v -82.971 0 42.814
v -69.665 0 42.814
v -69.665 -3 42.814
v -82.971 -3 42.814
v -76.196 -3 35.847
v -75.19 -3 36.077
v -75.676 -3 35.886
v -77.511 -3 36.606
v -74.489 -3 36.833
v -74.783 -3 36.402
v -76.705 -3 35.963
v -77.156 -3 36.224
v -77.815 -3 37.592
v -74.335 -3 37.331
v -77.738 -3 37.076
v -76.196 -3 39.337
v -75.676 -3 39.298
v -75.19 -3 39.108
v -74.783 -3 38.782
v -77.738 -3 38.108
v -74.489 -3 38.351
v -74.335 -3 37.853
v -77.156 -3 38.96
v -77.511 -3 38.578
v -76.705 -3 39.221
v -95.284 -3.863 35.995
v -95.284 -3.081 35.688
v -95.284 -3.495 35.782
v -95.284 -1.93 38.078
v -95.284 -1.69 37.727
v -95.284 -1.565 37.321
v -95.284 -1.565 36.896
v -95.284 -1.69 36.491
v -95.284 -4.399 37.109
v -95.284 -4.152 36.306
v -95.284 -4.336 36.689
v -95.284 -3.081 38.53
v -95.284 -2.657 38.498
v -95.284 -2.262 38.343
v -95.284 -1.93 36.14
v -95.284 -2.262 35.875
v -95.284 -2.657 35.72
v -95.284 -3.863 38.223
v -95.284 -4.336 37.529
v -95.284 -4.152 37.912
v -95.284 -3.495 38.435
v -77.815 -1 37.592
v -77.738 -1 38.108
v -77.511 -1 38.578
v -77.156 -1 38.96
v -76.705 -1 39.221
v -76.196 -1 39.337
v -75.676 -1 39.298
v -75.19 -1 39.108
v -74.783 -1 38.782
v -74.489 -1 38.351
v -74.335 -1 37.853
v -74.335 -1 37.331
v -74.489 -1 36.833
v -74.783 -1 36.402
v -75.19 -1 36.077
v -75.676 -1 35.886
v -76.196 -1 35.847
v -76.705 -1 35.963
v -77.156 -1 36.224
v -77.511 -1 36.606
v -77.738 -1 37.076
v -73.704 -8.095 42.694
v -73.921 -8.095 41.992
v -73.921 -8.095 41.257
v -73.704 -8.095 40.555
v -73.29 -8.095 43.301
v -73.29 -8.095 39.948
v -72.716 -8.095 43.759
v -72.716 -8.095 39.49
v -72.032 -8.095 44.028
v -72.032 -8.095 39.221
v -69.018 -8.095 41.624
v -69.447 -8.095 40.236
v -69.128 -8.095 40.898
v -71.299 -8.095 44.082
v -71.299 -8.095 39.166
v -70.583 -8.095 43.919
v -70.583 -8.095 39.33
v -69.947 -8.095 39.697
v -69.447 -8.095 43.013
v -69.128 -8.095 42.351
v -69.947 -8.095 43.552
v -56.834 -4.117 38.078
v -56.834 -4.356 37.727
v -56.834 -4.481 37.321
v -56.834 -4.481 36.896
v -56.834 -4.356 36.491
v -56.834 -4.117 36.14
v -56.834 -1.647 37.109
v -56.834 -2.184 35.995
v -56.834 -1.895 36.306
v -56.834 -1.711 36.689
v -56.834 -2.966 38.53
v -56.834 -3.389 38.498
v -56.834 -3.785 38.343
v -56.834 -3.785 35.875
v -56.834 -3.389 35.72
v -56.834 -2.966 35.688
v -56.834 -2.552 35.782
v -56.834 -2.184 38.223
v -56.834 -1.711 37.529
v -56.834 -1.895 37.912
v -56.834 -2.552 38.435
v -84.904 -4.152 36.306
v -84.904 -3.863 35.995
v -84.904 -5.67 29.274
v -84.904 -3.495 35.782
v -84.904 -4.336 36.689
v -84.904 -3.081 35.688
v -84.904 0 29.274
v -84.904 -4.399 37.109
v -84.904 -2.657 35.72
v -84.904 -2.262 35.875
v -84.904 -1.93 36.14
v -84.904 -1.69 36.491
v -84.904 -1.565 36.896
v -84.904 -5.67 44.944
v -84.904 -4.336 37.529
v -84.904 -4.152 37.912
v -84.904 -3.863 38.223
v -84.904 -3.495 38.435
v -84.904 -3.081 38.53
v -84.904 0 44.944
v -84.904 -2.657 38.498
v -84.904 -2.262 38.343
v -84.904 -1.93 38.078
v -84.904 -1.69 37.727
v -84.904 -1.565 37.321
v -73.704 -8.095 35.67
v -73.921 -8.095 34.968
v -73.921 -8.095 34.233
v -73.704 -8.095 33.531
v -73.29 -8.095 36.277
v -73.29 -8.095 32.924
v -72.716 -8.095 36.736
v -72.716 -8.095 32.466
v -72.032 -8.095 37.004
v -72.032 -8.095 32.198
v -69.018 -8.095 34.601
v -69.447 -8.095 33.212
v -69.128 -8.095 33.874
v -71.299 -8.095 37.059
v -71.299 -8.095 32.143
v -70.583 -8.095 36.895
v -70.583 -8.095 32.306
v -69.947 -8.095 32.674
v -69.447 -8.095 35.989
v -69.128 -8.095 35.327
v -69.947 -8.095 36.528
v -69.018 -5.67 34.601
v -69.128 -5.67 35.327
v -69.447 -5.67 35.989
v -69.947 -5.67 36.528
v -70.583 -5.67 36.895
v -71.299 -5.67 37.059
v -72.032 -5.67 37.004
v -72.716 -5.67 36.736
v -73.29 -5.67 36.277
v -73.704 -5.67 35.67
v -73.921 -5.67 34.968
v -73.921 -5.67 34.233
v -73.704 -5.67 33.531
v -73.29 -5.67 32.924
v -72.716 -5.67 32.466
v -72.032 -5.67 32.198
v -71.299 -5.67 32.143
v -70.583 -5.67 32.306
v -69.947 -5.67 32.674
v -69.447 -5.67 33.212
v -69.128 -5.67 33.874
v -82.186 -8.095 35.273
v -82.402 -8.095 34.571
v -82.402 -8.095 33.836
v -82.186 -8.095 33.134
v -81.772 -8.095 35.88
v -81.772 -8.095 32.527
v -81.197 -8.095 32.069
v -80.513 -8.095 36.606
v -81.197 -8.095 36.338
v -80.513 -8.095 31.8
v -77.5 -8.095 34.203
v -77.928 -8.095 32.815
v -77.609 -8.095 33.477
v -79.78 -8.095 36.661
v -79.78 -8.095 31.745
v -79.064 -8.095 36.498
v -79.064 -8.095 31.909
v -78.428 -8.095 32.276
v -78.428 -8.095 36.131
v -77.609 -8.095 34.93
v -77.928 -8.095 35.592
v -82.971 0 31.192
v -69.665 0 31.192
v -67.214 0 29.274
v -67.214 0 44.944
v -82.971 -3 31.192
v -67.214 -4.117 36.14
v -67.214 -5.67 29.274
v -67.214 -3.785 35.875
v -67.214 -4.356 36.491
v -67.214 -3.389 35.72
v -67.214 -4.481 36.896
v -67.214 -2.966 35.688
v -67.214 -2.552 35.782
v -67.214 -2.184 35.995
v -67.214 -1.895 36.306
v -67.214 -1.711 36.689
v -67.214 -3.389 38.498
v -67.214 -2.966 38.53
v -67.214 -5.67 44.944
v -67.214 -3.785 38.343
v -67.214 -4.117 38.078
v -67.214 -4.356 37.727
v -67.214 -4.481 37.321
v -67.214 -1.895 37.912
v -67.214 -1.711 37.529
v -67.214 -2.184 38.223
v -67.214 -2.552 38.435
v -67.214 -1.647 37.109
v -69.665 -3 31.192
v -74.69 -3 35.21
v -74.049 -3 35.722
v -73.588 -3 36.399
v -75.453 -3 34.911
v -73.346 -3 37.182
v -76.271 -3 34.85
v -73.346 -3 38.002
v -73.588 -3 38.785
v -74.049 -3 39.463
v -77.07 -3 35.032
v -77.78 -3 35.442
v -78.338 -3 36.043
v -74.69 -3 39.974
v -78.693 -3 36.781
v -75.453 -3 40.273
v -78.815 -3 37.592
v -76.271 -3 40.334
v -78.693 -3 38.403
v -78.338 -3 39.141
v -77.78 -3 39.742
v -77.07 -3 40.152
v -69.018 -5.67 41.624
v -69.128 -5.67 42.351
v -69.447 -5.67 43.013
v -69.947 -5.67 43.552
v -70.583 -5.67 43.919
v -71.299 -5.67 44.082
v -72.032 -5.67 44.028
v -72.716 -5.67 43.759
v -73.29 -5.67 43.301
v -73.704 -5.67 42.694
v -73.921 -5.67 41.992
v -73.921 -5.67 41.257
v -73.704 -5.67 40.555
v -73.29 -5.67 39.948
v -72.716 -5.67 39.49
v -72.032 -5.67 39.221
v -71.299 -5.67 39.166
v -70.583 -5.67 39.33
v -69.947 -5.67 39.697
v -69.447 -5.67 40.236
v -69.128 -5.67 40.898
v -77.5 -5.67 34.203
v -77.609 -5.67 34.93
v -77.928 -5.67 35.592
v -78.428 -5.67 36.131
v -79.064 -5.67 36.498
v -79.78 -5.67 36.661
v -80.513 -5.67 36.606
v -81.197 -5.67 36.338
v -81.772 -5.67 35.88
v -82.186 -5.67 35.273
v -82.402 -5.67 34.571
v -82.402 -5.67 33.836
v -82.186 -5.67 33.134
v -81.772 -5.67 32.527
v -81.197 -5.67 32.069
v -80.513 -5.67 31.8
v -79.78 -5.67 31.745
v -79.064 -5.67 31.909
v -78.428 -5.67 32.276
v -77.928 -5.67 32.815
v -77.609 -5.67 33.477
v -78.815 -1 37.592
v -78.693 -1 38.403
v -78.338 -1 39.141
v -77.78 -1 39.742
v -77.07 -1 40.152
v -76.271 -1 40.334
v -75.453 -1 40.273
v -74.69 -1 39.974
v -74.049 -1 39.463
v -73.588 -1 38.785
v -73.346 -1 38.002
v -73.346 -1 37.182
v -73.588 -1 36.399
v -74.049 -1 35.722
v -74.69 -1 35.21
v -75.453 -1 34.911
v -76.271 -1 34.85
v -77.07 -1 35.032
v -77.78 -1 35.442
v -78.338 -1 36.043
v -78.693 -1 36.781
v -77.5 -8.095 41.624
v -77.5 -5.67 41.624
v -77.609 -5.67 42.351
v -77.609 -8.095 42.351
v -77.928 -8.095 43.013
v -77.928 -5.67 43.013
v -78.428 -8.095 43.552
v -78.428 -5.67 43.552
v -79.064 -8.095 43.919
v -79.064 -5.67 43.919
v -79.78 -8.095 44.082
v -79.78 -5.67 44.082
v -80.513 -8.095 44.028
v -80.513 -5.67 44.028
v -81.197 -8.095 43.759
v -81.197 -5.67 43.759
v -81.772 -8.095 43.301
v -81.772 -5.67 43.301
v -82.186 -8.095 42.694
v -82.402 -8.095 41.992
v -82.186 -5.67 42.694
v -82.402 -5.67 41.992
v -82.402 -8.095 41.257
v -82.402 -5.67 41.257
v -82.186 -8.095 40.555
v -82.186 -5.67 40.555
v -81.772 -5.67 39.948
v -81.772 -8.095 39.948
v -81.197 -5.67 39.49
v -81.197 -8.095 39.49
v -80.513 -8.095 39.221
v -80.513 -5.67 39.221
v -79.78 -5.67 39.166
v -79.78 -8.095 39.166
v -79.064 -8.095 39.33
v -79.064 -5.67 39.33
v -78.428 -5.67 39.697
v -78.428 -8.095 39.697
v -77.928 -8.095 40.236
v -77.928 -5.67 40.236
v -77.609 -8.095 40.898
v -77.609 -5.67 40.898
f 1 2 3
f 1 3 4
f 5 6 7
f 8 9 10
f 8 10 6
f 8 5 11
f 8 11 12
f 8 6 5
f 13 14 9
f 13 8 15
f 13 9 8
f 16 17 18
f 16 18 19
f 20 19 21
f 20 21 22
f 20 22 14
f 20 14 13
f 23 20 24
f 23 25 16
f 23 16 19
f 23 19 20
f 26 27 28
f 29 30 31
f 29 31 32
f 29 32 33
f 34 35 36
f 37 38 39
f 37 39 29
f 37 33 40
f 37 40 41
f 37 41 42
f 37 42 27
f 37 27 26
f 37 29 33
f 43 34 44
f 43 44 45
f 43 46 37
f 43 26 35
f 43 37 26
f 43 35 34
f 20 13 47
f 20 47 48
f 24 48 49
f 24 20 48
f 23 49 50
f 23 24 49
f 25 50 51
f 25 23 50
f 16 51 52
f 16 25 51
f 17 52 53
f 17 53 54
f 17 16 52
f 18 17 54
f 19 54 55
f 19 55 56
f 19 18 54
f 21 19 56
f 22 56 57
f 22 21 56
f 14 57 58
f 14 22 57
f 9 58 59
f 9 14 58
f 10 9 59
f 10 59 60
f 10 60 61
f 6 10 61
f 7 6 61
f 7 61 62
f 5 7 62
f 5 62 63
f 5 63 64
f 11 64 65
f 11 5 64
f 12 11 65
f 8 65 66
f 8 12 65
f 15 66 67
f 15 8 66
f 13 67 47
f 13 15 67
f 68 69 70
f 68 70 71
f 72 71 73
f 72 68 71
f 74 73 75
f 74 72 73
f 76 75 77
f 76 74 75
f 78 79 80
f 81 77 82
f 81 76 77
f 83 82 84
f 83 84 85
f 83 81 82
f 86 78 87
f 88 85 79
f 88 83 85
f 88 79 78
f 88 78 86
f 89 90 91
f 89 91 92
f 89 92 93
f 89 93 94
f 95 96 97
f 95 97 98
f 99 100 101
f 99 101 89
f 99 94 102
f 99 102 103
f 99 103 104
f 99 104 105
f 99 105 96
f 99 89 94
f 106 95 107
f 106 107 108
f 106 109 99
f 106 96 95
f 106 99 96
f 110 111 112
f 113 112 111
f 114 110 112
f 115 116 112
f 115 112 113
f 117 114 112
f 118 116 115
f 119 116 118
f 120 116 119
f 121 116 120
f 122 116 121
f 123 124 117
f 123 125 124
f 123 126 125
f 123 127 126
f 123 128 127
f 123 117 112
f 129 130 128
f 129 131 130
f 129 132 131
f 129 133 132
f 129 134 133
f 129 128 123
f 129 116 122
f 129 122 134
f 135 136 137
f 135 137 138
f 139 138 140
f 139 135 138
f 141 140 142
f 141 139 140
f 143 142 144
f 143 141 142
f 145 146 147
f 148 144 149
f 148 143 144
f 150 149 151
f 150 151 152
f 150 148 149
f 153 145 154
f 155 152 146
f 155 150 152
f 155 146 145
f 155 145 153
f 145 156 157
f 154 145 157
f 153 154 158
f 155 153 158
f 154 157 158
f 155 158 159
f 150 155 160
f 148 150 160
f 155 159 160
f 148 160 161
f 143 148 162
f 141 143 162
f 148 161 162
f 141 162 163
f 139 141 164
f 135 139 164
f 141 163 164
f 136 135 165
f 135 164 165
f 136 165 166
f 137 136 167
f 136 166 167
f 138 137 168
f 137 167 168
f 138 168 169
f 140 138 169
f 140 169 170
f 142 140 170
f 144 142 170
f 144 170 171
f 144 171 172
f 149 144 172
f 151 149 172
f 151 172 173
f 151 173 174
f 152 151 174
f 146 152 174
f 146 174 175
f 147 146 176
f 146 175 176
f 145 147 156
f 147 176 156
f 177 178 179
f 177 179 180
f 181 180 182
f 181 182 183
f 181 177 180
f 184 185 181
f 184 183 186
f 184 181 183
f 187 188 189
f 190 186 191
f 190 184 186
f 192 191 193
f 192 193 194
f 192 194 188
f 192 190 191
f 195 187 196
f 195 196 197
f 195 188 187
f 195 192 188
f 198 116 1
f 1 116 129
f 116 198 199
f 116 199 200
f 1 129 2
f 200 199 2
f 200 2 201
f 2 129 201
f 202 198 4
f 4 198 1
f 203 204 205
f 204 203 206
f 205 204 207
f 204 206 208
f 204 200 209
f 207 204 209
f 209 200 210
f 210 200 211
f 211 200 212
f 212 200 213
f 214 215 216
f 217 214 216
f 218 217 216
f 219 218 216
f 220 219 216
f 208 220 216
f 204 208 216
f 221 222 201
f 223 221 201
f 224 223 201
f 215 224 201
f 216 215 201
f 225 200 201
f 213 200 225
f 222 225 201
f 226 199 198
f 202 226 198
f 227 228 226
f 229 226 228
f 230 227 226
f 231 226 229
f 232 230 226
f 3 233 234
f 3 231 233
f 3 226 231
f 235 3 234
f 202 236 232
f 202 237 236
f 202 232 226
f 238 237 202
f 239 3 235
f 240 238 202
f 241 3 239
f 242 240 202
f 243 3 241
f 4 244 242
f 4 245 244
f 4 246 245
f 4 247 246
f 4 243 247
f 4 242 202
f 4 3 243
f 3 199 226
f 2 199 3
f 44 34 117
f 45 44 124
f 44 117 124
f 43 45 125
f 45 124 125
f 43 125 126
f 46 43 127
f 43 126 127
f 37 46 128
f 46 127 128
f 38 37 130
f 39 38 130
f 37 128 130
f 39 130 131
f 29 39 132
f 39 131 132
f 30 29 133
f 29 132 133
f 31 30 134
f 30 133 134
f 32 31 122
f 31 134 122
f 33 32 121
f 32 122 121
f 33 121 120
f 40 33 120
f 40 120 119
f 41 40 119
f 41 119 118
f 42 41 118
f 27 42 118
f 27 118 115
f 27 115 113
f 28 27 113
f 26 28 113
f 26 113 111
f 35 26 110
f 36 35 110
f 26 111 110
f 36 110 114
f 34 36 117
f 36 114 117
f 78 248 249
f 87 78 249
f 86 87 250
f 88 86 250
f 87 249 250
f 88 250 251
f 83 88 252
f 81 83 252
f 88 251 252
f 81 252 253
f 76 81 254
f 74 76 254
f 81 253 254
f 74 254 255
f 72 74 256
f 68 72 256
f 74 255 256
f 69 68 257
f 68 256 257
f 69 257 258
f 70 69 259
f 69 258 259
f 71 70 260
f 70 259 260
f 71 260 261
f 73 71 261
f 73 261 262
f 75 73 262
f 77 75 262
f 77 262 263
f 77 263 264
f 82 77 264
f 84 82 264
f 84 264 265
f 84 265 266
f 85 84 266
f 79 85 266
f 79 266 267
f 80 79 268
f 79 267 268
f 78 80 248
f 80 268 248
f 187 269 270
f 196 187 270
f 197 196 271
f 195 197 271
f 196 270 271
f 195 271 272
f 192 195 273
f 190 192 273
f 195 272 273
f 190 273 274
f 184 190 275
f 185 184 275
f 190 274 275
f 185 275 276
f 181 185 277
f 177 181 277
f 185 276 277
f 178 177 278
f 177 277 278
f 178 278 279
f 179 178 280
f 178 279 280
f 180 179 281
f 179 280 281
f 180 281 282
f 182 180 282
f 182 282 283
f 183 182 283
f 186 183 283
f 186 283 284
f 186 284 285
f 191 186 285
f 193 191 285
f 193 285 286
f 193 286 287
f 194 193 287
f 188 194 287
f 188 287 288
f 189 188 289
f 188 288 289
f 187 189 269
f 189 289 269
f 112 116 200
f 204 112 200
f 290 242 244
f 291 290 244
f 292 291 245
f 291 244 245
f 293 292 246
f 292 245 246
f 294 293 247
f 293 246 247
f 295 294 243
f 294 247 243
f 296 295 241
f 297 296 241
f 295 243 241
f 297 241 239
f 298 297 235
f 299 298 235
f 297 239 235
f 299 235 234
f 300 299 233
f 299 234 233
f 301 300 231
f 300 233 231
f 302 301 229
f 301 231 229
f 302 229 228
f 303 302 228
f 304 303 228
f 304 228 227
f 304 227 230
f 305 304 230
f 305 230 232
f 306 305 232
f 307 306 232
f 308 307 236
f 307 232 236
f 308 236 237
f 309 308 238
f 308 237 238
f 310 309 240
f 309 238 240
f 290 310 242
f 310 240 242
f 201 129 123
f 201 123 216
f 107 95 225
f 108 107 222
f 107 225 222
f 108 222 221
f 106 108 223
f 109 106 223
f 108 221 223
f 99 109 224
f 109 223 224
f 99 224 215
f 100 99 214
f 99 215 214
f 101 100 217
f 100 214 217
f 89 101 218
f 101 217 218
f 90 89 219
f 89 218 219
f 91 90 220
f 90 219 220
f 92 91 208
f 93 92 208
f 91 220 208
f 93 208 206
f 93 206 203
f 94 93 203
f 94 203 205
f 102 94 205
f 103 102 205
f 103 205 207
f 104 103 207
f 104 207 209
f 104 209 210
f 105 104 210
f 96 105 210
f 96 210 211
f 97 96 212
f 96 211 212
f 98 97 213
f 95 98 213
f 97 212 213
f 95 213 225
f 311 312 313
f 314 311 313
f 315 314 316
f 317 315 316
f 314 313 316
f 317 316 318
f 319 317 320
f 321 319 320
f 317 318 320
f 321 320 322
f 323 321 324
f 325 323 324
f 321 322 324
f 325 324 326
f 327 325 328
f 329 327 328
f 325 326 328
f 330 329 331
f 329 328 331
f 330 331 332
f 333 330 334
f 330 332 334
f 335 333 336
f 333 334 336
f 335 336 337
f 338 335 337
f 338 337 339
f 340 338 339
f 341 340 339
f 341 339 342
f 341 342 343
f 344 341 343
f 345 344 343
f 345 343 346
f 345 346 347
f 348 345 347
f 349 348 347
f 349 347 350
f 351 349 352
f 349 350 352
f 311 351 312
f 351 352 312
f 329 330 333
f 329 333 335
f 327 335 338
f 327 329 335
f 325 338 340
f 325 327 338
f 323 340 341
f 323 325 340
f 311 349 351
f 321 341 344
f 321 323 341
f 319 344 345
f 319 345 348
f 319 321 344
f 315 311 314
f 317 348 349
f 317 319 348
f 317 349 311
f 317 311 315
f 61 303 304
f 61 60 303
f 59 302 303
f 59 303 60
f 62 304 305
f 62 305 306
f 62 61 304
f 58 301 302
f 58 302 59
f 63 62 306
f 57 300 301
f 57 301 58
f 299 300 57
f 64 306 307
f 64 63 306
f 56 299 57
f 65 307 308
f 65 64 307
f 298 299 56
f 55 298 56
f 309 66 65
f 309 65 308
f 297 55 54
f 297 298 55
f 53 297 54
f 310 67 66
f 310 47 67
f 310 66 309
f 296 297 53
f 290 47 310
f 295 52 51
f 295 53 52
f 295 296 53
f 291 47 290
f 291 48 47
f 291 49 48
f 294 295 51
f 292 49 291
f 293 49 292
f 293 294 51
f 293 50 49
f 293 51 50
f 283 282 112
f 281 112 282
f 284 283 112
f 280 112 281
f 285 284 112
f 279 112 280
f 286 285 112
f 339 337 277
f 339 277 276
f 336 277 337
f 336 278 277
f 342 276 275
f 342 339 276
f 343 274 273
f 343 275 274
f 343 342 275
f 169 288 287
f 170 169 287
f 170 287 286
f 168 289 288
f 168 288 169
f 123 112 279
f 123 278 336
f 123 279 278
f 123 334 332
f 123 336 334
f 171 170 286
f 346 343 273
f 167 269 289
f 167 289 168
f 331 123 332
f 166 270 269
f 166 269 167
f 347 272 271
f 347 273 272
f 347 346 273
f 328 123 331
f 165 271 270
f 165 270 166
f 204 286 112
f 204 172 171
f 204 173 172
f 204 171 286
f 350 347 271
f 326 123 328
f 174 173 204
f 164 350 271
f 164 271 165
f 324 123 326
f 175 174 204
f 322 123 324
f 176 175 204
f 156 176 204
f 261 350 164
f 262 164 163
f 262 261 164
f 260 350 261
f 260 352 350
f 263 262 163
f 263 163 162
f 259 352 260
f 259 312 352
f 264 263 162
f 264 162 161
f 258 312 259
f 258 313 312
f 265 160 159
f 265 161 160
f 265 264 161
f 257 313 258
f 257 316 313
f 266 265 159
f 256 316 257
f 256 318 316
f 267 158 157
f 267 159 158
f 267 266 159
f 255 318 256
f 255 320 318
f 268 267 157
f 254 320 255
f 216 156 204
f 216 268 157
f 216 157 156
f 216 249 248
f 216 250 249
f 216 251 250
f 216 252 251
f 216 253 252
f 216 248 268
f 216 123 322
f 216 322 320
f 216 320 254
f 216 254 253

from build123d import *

# Parameters (mm, degrees)
F0_R      = 7.84357
F0_R_2    = 7.775719
F1_DEPTH  = 5.67
F2_W      = 17.690338
F2_H      = 15.67
F3_DEPTH  = 5.67
F4_R      = 1.425
F5_DEPTH  = 10.38
F6_R      = 1.425
F7_DEPTH  = 10.38
F9_R      = 2.465
F10_DEPTH = 2.425
F11_W     = 13.306394
F11_H     = 11.622041
F12_DEPTH = 3
F13_R     = 2.75
F13_R_2   = 1.75
F14_DEPTH = 2


with BuildPart() as f1:
    # F0 (on Front) → F1 (new body)
    with BuildSketch(Plane.XZ):
        with Locations((-31.018244, 13.502214)):
            Circle(F0_R)
        with Locations((27.656266, 13.502214)):
            Circle(F0_R_2)
        with Locations((-31.018244, -35.786617)):
            Circle(F0_R_2)
        with Locations((27.656266, -35.786617)):
            Circle(F0_R_2)
    extrude(amount=F1_DEPTH)


with BuildPart() as f3:
    # F2 (on Front) → F3 (new body)
    with BuildSketch(Plane.XZ):
        with Locations((-76.058906, 37.108815)):
            Rectangle(F2_W, F2_H)
    extrude(amount=F3_DEPTH)

    # F4 (on face) → F5 (join)
    with BuildSketch(Plane(origin=(-84.904075, 0, 0), x_dir=(0, -1, 0), z_dir=(-1, 0, 0))):
        with Locations((2.974371, 37.108815)):
            Circle(F4_R)
    extrude(amount=F5_DEPTH)

    # F6 (on face) → F7 (join)
    with BuildSketch(Plane.YZ.offset(-67.213737)):
        with Locations((-3.072243, 37.108815)):
            Circle(F6_R)
    extrude(amount=F7_DEPTH)

    # F9 (on face) → F10 (join)
    with BuildSketch(Plane.XZ.offset(5.67)):
        with Locations((-79.964688, 41.62437)):
            Circle(F9_R)
        with Locations((-71.483449, 41.62437)):
            Circle(F9_R)
        with Locations((-79.964688, 34.203287)):
            Circle(F9_R)
        with Locations((-71.483449, 34.600842)):
            Circle(F9_R)
    extrude(amount=F10_DEPTH)

    # F11 (on face) → F12 (cut)
    with BuildSketch(Plane(origin=(0, 0, 0), x_dir=(-1, 0, 0), z_dir=(0, 1, 0))):
        with Locations((76.318003, 37.002533)):
            Rectangle(F11_W, F11_H)
    extrude(amount=-F12_DEPTH, mode=Mode.SUBTRACT)

    # F13 (on face) → F14 (join)
    with BuildSketch(Plane(origin=(0, -3, 0), x_dir=(-1, 0, 0), z_dir=(0, 1, 0))):
        with Locations((76.065354, 37.592057)):
            Circle(F13_R)
        with Locations((76.065354, 37.592057)):
            Circle(F13_R_2, mode=Mode.SUBTRACT)
    extrude(amount=F14_DEPTH)


solid = f3.part
